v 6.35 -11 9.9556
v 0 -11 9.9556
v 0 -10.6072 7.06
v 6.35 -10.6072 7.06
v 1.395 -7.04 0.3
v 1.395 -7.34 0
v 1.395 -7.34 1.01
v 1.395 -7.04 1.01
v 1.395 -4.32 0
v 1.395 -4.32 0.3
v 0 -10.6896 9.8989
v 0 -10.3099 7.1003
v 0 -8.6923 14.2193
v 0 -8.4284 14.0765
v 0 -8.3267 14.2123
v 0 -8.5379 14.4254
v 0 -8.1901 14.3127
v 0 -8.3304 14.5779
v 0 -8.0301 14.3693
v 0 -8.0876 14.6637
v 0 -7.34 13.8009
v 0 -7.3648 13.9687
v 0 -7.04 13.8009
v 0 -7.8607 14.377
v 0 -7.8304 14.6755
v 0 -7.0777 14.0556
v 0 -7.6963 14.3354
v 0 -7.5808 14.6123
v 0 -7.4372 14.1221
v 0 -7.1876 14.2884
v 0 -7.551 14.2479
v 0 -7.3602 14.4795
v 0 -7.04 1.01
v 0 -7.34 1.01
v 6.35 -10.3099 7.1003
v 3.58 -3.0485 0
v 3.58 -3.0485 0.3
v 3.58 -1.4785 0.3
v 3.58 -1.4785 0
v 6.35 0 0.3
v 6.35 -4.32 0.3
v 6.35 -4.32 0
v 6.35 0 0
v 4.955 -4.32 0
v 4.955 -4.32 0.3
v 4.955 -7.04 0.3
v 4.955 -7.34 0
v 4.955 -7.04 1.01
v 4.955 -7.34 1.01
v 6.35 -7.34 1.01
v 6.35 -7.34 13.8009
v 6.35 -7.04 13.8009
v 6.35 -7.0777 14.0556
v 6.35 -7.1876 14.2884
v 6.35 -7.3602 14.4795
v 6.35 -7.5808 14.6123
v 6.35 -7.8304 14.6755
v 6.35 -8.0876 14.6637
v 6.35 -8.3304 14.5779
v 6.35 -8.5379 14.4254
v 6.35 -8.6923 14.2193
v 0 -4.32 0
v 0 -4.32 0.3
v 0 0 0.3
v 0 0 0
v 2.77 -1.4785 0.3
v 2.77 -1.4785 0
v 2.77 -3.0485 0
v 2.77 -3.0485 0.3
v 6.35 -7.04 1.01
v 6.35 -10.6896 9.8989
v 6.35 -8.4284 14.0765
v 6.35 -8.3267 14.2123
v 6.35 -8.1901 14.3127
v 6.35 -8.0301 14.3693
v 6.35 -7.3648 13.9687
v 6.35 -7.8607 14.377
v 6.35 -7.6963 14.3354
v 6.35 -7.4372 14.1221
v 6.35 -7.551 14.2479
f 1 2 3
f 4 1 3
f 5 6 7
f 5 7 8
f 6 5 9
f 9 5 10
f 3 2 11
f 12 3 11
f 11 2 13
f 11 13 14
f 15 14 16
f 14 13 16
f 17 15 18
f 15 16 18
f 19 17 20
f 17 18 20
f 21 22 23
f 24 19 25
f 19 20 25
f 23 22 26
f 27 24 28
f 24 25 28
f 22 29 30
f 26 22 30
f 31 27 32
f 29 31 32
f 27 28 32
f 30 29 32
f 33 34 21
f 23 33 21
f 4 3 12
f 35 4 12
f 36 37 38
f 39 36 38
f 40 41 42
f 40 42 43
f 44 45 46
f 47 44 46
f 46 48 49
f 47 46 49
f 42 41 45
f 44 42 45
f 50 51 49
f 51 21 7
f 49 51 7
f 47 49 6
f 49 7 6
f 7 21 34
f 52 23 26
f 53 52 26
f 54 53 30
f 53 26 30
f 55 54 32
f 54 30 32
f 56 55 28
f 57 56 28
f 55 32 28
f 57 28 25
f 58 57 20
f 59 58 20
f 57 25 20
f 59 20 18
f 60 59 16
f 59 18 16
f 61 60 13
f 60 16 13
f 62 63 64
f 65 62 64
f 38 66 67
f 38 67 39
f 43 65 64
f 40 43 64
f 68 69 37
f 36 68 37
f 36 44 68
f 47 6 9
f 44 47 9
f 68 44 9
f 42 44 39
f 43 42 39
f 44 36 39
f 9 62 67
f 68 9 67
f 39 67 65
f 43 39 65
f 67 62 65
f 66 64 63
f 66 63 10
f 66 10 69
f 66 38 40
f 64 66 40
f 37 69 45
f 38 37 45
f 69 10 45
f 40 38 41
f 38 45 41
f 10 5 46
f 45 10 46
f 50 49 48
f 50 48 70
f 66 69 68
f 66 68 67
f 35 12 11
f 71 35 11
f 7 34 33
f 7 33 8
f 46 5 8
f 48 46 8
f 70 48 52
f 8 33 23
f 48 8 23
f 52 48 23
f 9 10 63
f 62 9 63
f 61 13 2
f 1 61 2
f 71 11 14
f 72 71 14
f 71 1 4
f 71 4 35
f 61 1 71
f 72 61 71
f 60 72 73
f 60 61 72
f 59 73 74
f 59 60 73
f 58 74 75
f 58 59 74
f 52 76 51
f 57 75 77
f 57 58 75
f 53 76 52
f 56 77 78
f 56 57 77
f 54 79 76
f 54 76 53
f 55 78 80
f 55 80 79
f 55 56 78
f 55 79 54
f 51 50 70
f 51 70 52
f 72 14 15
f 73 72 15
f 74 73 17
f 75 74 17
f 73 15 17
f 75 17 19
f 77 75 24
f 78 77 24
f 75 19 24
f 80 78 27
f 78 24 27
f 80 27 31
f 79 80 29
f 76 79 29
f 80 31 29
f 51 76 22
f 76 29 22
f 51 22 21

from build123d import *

# Parameters (mm, degrees)
F1_DEPTH = 6.35
F2_W     = 1.395
F2_H     = 0.71
F3_DEPTH = 0.3
F4_W     = 0.81
F4_H     = 1.57
F5_DEPTH = 0.3


with BuildPart() as f1:
    # F0 (on Right) → F1 (new body)
    with BuildSketch(Plane.YZ):
        with BuildLine():
            Line((-7.34, 0), (0, 0))
            Line((0, 0), (0, 0.3))
            Line((0, 0.3), (-7.04, 0.3))
            Line((-7.04, 0.3), (-7.04, 13.800869))
            ThreePointArc((-7.04, 13.800869), (-7.703292, 14.653092), (-8.692279, 14.219335))
            Line((-8.692279, 14.219335), (-11, 9.955639))
            Line((-11, 9.955639), (-10.607156, 7.06))
            Line((-10.607156, 7.06), (-10.309879, 7.100331))
            Line((-10.309879, 7.100331), (-10.68956, 9.898947))
            Line((-10.68956, 9.898947), (-8.428445, 14.076535))
            ThreePointArc((-8.428445, 14.076535), (-7.776946, 14.362275), (-7.34, 13.800869))
            Line((-7.34, 13.800869), (-7.34, 0))
        make_face()
    extrude(amount=F1_DEPTH)

    # F2 (on face) → F3 (cut, through all)
    with BuildSketch(Plane.XZ.offset(7.34)):
        with Locations((5.6525, 0.655)):
            Rectangle(F2_W, F2_H)
        with Locations((0.6975, 0.655)):
            Rectangle(F2_W, F2_H)
    extrude(amount=-F3_DEPTH, mode=Mode.SUBTRACT)

    # F4 (on face) → F5 (cut, through all)
    with BuildSketch(Plane.XY.offset(0.3)):
        Polygon((0, -4.32), (0, -7.34), (1.395, -7.34), (1.395, -7.04), (1.395, -4.32), align=None)
        Polygon((4.955, -4.32), (4.955, -7.04), (4.955, -7.34), (6.35, -7.34), (6.35, -4.32), align=None)
        with Locations((3.175, -2.263539)):
            Rectangle(F4_W, F4_H)
    extrude(amount=-F5_DEPTH, mode=Mode.SUBTRACT)


solid = f1.part
